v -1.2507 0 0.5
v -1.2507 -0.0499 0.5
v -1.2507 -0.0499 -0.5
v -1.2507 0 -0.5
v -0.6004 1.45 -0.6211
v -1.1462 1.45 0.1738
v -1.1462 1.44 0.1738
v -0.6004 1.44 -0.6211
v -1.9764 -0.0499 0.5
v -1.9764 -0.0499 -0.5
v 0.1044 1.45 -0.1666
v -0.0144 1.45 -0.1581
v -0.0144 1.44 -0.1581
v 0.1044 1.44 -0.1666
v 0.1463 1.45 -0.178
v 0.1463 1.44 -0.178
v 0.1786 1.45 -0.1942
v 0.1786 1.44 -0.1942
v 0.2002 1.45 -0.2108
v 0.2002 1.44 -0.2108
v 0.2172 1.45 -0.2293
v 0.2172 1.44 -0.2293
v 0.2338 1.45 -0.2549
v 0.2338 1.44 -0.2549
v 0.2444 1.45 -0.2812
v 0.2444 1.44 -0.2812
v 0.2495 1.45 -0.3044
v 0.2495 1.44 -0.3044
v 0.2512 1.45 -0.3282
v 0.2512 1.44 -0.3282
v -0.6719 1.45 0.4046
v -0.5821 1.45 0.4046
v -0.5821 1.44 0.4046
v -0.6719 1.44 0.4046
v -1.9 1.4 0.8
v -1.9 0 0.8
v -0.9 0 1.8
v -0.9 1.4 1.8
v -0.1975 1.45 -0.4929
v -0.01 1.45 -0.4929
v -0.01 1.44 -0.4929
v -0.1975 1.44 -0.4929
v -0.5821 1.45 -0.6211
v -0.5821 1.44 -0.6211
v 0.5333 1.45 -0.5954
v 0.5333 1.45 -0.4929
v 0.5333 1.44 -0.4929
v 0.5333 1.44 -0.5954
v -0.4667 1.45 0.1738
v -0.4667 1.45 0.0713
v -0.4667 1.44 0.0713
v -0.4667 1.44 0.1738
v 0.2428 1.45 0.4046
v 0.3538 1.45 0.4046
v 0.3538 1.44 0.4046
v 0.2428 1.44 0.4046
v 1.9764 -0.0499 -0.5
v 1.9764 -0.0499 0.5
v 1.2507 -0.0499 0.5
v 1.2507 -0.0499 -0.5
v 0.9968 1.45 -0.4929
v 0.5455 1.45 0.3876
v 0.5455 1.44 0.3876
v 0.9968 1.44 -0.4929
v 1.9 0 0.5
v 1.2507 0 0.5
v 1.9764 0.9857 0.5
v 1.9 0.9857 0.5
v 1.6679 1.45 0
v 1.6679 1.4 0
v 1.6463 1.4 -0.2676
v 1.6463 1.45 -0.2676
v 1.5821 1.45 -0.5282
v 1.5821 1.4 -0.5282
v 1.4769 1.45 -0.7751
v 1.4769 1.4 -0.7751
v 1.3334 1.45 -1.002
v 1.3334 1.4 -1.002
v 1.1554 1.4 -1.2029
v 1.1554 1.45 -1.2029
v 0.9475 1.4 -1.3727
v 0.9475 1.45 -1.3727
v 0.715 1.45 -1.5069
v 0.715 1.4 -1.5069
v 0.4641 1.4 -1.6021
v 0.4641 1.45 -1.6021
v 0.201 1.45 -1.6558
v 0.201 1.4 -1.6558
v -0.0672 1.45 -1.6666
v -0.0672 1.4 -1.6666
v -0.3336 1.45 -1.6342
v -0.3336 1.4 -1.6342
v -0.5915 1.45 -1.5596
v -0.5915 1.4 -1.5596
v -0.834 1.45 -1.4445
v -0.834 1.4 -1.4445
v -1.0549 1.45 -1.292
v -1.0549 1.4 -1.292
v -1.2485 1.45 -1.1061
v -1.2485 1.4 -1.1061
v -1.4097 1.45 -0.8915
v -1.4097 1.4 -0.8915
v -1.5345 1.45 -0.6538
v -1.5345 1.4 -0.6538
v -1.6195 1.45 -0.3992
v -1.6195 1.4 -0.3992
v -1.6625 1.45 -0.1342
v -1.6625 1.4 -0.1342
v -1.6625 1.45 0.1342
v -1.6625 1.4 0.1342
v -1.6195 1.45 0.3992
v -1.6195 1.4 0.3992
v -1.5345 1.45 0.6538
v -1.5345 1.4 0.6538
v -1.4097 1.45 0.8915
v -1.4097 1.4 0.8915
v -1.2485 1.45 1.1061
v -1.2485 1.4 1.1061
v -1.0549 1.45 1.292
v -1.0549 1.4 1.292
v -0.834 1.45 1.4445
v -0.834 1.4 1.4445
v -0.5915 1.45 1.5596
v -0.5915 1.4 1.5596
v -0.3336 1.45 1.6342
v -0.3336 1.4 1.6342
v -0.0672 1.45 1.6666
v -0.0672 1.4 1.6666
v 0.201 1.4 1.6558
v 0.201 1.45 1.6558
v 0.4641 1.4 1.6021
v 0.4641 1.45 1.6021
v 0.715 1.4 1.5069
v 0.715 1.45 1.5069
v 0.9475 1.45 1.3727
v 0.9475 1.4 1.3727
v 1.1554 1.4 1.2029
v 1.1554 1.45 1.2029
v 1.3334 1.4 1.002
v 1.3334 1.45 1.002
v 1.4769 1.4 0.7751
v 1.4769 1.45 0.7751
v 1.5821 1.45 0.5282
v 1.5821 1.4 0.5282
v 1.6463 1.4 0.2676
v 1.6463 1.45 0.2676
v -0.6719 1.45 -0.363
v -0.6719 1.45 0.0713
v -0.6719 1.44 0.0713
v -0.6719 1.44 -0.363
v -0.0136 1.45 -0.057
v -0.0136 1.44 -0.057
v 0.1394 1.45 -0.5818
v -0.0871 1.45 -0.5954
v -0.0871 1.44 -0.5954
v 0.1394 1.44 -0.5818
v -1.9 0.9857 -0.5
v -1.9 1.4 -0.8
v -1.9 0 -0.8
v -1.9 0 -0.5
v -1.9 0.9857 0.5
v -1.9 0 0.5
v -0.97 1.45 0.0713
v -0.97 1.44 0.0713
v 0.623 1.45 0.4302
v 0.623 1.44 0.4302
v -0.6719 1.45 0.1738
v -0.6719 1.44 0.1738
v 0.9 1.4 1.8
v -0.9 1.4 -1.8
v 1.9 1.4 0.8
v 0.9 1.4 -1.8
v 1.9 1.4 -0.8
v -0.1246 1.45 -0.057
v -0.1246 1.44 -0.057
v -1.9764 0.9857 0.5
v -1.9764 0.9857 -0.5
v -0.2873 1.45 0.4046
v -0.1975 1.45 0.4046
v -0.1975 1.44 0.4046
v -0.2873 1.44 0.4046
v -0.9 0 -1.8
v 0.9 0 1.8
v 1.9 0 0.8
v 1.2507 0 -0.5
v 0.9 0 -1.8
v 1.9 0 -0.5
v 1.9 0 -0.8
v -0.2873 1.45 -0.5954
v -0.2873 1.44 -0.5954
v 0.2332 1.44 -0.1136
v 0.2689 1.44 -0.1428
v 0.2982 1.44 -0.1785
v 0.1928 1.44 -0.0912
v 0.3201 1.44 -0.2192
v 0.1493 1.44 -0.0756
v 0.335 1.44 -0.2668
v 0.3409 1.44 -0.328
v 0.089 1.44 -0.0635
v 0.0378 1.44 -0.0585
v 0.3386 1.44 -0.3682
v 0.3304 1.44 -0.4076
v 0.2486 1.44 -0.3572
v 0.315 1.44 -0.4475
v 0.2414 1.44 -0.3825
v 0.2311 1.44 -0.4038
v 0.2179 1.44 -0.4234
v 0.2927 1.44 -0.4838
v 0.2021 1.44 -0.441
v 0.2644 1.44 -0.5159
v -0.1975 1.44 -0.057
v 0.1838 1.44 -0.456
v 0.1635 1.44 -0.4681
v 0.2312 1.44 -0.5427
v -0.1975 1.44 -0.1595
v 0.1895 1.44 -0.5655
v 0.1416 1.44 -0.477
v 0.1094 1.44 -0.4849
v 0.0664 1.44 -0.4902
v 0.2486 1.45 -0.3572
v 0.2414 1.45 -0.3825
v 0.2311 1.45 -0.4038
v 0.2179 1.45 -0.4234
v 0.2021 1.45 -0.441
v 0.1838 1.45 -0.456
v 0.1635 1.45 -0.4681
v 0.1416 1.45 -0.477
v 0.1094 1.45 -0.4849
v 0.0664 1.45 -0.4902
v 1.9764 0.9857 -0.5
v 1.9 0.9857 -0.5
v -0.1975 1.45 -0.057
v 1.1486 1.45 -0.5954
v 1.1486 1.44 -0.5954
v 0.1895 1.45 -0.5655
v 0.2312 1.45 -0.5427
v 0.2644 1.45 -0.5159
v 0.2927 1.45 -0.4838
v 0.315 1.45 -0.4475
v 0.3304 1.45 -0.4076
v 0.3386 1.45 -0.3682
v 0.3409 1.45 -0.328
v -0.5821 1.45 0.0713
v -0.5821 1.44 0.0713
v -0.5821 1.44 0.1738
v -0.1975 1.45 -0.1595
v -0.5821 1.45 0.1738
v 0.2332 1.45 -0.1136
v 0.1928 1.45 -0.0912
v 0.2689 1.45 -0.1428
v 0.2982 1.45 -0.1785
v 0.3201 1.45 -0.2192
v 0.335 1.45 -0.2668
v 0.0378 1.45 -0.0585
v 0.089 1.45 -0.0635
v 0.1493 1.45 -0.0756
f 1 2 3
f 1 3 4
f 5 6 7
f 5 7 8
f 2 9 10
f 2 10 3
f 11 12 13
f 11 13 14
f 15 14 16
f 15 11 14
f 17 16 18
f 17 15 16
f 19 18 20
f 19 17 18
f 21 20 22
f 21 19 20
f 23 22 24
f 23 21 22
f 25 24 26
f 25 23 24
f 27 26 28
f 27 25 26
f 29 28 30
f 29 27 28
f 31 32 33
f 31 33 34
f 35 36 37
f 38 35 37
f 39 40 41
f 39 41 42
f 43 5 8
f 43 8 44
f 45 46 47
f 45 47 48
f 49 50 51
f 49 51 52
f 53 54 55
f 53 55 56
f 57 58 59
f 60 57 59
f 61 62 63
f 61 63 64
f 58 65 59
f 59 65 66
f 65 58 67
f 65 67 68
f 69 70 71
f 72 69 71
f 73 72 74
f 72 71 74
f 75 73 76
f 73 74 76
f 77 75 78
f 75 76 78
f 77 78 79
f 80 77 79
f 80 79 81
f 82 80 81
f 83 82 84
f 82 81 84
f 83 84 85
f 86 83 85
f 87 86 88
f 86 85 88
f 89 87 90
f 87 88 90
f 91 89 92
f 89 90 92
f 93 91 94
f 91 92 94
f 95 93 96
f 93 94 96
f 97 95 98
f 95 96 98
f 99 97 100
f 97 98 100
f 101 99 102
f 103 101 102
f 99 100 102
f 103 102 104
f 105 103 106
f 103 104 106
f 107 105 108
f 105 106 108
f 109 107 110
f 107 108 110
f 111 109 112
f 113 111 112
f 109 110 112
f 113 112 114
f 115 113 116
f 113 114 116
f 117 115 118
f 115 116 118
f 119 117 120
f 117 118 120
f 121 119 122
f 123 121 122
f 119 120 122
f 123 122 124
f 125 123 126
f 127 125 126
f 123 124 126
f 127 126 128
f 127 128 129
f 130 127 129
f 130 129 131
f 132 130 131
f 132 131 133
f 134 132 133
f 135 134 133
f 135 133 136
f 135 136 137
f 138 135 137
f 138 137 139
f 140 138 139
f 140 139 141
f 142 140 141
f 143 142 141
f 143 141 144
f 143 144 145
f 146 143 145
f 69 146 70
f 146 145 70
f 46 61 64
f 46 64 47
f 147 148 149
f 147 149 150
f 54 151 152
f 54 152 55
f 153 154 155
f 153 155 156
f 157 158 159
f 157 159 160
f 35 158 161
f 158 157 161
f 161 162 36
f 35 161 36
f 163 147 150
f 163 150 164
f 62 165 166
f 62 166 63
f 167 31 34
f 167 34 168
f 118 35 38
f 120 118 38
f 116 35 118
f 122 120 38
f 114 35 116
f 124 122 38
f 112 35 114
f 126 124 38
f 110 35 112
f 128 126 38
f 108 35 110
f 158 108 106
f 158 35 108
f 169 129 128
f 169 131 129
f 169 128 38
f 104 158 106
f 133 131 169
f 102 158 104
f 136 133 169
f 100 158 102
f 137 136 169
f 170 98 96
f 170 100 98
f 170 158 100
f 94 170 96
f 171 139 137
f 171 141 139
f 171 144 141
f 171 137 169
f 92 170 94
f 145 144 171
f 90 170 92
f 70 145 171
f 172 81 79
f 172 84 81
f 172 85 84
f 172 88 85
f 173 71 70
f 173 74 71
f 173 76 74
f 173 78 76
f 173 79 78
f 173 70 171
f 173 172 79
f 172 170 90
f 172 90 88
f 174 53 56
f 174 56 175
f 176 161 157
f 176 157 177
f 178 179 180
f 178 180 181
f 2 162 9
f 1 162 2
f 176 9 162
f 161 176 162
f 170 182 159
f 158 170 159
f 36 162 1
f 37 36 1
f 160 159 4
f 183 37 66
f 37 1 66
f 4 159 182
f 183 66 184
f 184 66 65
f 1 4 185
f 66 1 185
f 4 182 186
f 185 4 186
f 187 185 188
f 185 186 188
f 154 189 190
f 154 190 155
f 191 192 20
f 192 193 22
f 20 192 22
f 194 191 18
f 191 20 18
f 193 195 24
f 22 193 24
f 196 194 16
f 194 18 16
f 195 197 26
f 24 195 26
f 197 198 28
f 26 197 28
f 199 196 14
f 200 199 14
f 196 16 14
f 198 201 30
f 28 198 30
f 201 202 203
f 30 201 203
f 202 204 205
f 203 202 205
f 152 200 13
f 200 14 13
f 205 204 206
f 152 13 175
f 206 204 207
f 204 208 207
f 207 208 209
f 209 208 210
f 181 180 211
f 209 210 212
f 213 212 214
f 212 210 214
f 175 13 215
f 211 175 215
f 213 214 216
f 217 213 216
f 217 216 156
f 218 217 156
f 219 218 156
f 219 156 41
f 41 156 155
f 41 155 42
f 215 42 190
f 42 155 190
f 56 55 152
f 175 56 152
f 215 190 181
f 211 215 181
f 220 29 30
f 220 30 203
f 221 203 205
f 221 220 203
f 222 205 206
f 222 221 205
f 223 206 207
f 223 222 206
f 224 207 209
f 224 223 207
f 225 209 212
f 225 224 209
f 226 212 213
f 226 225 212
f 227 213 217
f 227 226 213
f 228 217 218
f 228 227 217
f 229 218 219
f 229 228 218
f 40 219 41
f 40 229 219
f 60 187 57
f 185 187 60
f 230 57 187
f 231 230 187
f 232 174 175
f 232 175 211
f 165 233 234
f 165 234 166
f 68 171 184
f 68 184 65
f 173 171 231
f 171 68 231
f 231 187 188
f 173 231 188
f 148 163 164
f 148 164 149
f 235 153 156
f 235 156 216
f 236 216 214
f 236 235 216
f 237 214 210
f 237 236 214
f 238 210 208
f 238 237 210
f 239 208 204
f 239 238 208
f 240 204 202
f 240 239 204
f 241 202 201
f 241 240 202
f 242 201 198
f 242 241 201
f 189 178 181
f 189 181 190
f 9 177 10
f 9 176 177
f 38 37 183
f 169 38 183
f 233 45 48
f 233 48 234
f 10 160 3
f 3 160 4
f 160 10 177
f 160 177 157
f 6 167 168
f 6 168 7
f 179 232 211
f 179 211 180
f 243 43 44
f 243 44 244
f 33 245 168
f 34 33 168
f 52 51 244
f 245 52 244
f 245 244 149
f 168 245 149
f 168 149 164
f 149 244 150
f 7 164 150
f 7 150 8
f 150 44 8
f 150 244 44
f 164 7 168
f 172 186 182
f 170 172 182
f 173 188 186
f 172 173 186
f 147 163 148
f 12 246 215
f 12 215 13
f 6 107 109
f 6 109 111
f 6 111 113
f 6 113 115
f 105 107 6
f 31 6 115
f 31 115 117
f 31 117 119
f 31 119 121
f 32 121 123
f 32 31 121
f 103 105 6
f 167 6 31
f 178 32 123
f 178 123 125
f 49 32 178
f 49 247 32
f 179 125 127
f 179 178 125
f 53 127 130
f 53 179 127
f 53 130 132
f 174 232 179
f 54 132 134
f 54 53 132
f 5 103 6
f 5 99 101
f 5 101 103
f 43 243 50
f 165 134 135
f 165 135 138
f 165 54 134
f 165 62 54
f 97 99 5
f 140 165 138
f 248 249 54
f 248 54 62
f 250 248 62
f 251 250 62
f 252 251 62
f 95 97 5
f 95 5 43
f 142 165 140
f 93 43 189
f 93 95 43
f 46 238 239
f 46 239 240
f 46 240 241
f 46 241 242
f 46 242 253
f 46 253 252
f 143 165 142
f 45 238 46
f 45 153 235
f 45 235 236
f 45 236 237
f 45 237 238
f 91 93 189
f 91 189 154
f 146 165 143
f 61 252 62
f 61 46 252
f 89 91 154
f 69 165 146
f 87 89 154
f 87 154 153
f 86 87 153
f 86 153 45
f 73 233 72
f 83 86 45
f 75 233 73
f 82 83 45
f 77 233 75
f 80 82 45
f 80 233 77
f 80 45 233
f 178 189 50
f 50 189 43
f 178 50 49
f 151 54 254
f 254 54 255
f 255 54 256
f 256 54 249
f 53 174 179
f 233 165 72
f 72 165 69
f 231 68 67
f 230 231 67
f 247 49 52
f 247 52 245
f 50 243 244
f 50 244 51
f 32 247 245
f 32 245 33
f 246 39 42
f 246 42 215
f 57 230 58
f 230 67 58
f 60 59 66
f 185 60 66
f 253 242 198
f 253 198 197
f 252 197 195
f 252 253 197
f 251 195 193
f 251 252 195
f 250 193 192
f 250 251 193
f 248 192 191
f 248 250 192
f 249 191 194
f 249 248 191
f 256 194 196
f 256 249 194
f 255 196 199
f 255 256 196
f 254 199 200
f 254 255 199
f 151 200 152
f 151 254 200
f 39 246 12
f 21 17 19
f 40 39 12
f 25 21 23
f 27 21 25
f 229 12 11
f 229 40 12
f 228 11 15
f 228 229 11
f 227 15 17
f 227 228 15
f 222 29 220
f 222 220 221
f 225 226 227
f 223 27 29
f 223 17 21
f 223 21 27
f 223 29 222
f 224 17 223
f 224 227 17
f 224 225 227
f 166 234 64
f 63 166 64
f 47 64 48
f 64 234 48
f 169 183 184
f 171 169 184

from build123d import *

# Parameters (mm, degrees)
BOSS_EXTRUDE1_DEPTH = 1.4
SKETCH2_R           = 1.667945685
BOSS_EXTRUDE2_DEPTH = 0.05
EXTRUDE_THIN1_DEPTH = 0.5
CUT_EXTRUDE1_DEPTH  = 0.01


with BuildPart() as part:
    # Sketch1 → Boss-Extrude1 (new body)
    with BuildSketch(Plane(origin=(0, 0, 0), x_dir=(1, 0, 0), z_dir=(0, 1, 0))):
        Polygon((-0.9, 1.8), (-1.9, 0.8), (-1.9, -0.8), (-0.9, -1.8), (0.9, -1.8), (1.9, -0.8), (1.9, 0.8), (0.9, 1.8), align=None)
    extrude(amount=BOSS_EXTRUDE1_DEPTH)

    # Sketch2 → Boss-Extrude2 (add)
    with BuildSketch(Plane(origin=(0, 1.4, 0), x_dir=(1, 0, 0), z_dir=(0, 1, 0))):
        Circle(SKETCH2_R)
    extrude(amount=BOSS_EXTRUDE2_DEPTH)

    # Sketch3 → Extrude-Thin1 (add, symmetric)
    with BuildSketch(Plane.XY):
        Polygon((-1.976364114, 0.98571962), (-1.976364114, -0.049866004), (-1.250724891, -0.049866004), (-1.250724891, 0.050133996), (-1.876364114, 0.050133996), (-1.876364114, 0.98571962), align=None)
    extrude_thin1 = extrude(amount=EXTRUDE_THIN1_DEPTH, both=True)

    # Mirror1: Extrude-Thin1 across plane
    add(extrude_thin1.mirror(Plane(origin=(0, 0, 0), x_dir=(0, 0, 1), z_dir=(1, 0, 0))))

    # Sketch4 → Cut-Extrude1 (cut)
    with BuildSketch(Plane(origin=(0, 1.45, 0), x_dir=(1, 0, 0), z_dir=(0, 1, 0))):
        Polygon((-0.600359123, 0.621056828), (-0.582129956, 0.621056828), (-0.582129956, -0.071250864), (-0.466745341, -0.071250864), (-0.466745341, -0.173814967), (-0.582129956, -0.173814967), (-0.582129956, -0.404584198), (-0.671873546, -0.404584198), (-0.671873546, -0.173814967), (-1.146232521, -0.173814967), align=None)
        Polygon((-0.671873546, -0.071250864), (-0.671873546, 0.363044008), (-0.969950469, -0.071250864), align=None, mode=Mode.SUBTRACT)
        with BuildLine():
            Line((-0.287258162, 0.595415802), (-0.087137969, 0.595415802))
            add(Edge.make_bspline(
                [(-0.087137969, 0.595415802), (-0.073783361, 0.595371349), (-0.048141034, 0.595285994), (-0.011405814, 0.594810062), (0.021973357, 0.593445961), (0.051979025, 0.59227208), (0.078610641, 0.590131525), (0.101949867, 0.588085626), (0.121889209, 0.585407437), (0.133959452, 0.582920173), (0.139424531, 0.581794008)],
                knots=[0, 0, 0, 0, 4.0065e-05, 7.6928e-05, 0.000110203, 0.000140284, 0.000167002, 0.000190343, 0.000210571, 0.000227307, 0.000227307, 0.000227307, 0.000227307], degree=3))
            add(Edge.make_bspline(
                [(0.139424531, 0.581794008), (0.146740709, 0.57998636), (0.161216992, 0.576409628), (0.182059868, 0.568849742), (0.201921103, 0.560101278), (0.220718196, 0.549825929), (0.238356993, 0.537947421), (0.255019368, 0.524670814), (0.270780929, 0.510068755), (0.285004252, 0.493773086), (0.298415409, 0.476676941), (0.309726446, 0.458190153), (0.319476868, 0.438858288), (0.327239873, 0.41848474), (0.333490723, 0.397267091), (0.33789822, 0.375013149), (0.340541416, 0.351824299), (0.340810518, 0.336007754), (0.340946967, 0.327987918)],
                knots=[0, 0, 0, 0, 2.2595e-05, 4.4707e-05, 6.6409e-05, 8.7656e-05, 0.00010888, 0.000130123, 0.000151523, 0.000173233, 0.000194949, 0.000216629, 0.000238129, 0.000259818, 0.000281941, 0.000304413, 0.000327795, 0.000351847, 0.000351847, 0.000351847, 0.000351847], degree=3))
            add(Edge.make_bspline(
                [(0.340946967, 0.327987918), (0.340527253, 0.314663602), (0.339708283, 0.288664411), (0.332072539, 0.250932731), (0.319564962, 0.215735784), (0.302329736, 0.183117887), (0.280381315, 0.153714846), (0.254002803, 0.127889002), (0.223179485, 0.106277598), (0.194485395, 0.091291082), (0.169138481, 0.081693108), (0.14827182, 0.074939863), (0.125509827, 0.069722159), (0.101070588, 0.065047835), (0.074852401, 0.06151878), (0.046918104, 0.058934039), (0.017247775, 0.057318596), (-0.003134816, 0.057078023), (-0.013620341, 0.056954264)],
                knots=[0, 0, 0, 0, 3.9936e-05, 7.7926e-05, 0.000114928, 0.000151669, 0.000188168, 0.000224574, 0.000261926, 0.000300721, 0.00032133, 0.000343187, 0.000366461, 0.00039133, 0.000417819, 0.000445785, 0.000475476, 0.000506932, 0.000506932, 0.000506932, 0.000506932], degree=3))
            Line((-0.013620341, 0.056954264), (0.353767479, -0.404584198))
            Line((0.353767479, -0.404584198), (0.242789915, -0.404584198))
            Line((0.242789915, -0.404584198), (-0.124597905, 0.056954264))
            Line((-0.124597905, 0.056954264), (-0.197514572, 0.056954264))
            Line((-0.197514572, 0.056954264), (-0.197514572, -0.404584198))
            Line((-0.197514572, -0.404584198), (-0.287258162, -0.404584198))
            Line((-0.287258162, -0.404584198), (-0.287258162, 0.595415802))
        make_face()
        with BuildLine():
            Line((-0.197514572, 0.4928517), (-0.197514572, 0.159518367))
            Line((-0.197514572, 0.159518367), (-0.014421623, 0.158116123))
            add(Edge.make_bspline(
                [(-0.014421623, 0.158116123), (-0.005873041, 0.158112341), (0.010696547, 0.158105011), (0.034668166, 0.15924609), (0.056988198, 0.160544181), (0.07757127, 0.162529708), (0.096426577, 0.165088585), (0.113544695, 0.168289438), (0.128953567, 0.172018599), (0.146924578, 0.177790492), (0.166992158, 0.186935069), (0.188801147, 0.200239497), (0.207373243, 0.216973531), (0.223064061, 0.236108804), (0.23567247, 0.257147732), (0.244561629, 0.279838123), (0.250202326, 0.303607151), (0.250867625, 0.319943754), (0.251203377, 0.328188238)],
                knots=[0, 0, 0, 0, 2.5642e-05, 4.9701e-05, 7.1981e-05, 9.2711e-05, 0.00011172, 0.000129047, 0.000144934, 0.000159251, 0.000185611, 0.000210901, 0.000235588, 0.000260211, 0.000284912, 0.000308831, 0.00033308, 0.000357785, 0.000357785, 0.000357785, 0.000357785], degree=3))
            add(Edge.make_bspline(
                [(0.251203377, 0.328188238), (0.250859914, 0.336230117), (0.250179295, 0.352166185), (0.244622504, 0.375496445), (0.235225538, 0.397515573), (0.222562041, 0.418133998), (0.207133711, 0.436849922), (0.189042908, 0.452863395), (0.168784281, 0.466077527), (0.149849653, 0.474521636), (0.132925592, 0.479698737), (0.118231403, 0.483341927), (0.101628124, 0.486268918), (0.083035136, 0.488614078), (0.062531813, 0.490629776), (0.040014484, 0.491987427), (0.015632547, 0.492791389), (-0.001266577, 0.492831128), (-0.010014572, 0.4928517)],
                knots=[0, 0, 0, 0, 2.4106e-05, 4.7769e-05, 7.1469e-05, 9.5656e-05, 0.000120124, 0.000143963, 0.000167855, 0.000192425, 0.000205857, 0.000220919, 0.000237814, 0.0002564, 0.00027713, 0.00029961, 0.000324062, 0.000350305, 0.000350305, 0.000350305, 0.000350305], degree=3))
            Line((-0.010014572, 0.4928517), (-0.197514572, 0.4928517))
        make_face(mode=Mode.SUBTRACT)
        Polygon((0.533254659, 0.595415802), (1.148639274, 0.595415802), (0.622998249, -0.430225223), (0.54547421, -0.387556954), (0.996796326, 0.4928517), (0.533254659, 0.4928517), align=None)
    extrude(amount=-CUT_EXTRUDE1_DEPTH, mode=Mode.SUBTRACT)


solid = part.part
